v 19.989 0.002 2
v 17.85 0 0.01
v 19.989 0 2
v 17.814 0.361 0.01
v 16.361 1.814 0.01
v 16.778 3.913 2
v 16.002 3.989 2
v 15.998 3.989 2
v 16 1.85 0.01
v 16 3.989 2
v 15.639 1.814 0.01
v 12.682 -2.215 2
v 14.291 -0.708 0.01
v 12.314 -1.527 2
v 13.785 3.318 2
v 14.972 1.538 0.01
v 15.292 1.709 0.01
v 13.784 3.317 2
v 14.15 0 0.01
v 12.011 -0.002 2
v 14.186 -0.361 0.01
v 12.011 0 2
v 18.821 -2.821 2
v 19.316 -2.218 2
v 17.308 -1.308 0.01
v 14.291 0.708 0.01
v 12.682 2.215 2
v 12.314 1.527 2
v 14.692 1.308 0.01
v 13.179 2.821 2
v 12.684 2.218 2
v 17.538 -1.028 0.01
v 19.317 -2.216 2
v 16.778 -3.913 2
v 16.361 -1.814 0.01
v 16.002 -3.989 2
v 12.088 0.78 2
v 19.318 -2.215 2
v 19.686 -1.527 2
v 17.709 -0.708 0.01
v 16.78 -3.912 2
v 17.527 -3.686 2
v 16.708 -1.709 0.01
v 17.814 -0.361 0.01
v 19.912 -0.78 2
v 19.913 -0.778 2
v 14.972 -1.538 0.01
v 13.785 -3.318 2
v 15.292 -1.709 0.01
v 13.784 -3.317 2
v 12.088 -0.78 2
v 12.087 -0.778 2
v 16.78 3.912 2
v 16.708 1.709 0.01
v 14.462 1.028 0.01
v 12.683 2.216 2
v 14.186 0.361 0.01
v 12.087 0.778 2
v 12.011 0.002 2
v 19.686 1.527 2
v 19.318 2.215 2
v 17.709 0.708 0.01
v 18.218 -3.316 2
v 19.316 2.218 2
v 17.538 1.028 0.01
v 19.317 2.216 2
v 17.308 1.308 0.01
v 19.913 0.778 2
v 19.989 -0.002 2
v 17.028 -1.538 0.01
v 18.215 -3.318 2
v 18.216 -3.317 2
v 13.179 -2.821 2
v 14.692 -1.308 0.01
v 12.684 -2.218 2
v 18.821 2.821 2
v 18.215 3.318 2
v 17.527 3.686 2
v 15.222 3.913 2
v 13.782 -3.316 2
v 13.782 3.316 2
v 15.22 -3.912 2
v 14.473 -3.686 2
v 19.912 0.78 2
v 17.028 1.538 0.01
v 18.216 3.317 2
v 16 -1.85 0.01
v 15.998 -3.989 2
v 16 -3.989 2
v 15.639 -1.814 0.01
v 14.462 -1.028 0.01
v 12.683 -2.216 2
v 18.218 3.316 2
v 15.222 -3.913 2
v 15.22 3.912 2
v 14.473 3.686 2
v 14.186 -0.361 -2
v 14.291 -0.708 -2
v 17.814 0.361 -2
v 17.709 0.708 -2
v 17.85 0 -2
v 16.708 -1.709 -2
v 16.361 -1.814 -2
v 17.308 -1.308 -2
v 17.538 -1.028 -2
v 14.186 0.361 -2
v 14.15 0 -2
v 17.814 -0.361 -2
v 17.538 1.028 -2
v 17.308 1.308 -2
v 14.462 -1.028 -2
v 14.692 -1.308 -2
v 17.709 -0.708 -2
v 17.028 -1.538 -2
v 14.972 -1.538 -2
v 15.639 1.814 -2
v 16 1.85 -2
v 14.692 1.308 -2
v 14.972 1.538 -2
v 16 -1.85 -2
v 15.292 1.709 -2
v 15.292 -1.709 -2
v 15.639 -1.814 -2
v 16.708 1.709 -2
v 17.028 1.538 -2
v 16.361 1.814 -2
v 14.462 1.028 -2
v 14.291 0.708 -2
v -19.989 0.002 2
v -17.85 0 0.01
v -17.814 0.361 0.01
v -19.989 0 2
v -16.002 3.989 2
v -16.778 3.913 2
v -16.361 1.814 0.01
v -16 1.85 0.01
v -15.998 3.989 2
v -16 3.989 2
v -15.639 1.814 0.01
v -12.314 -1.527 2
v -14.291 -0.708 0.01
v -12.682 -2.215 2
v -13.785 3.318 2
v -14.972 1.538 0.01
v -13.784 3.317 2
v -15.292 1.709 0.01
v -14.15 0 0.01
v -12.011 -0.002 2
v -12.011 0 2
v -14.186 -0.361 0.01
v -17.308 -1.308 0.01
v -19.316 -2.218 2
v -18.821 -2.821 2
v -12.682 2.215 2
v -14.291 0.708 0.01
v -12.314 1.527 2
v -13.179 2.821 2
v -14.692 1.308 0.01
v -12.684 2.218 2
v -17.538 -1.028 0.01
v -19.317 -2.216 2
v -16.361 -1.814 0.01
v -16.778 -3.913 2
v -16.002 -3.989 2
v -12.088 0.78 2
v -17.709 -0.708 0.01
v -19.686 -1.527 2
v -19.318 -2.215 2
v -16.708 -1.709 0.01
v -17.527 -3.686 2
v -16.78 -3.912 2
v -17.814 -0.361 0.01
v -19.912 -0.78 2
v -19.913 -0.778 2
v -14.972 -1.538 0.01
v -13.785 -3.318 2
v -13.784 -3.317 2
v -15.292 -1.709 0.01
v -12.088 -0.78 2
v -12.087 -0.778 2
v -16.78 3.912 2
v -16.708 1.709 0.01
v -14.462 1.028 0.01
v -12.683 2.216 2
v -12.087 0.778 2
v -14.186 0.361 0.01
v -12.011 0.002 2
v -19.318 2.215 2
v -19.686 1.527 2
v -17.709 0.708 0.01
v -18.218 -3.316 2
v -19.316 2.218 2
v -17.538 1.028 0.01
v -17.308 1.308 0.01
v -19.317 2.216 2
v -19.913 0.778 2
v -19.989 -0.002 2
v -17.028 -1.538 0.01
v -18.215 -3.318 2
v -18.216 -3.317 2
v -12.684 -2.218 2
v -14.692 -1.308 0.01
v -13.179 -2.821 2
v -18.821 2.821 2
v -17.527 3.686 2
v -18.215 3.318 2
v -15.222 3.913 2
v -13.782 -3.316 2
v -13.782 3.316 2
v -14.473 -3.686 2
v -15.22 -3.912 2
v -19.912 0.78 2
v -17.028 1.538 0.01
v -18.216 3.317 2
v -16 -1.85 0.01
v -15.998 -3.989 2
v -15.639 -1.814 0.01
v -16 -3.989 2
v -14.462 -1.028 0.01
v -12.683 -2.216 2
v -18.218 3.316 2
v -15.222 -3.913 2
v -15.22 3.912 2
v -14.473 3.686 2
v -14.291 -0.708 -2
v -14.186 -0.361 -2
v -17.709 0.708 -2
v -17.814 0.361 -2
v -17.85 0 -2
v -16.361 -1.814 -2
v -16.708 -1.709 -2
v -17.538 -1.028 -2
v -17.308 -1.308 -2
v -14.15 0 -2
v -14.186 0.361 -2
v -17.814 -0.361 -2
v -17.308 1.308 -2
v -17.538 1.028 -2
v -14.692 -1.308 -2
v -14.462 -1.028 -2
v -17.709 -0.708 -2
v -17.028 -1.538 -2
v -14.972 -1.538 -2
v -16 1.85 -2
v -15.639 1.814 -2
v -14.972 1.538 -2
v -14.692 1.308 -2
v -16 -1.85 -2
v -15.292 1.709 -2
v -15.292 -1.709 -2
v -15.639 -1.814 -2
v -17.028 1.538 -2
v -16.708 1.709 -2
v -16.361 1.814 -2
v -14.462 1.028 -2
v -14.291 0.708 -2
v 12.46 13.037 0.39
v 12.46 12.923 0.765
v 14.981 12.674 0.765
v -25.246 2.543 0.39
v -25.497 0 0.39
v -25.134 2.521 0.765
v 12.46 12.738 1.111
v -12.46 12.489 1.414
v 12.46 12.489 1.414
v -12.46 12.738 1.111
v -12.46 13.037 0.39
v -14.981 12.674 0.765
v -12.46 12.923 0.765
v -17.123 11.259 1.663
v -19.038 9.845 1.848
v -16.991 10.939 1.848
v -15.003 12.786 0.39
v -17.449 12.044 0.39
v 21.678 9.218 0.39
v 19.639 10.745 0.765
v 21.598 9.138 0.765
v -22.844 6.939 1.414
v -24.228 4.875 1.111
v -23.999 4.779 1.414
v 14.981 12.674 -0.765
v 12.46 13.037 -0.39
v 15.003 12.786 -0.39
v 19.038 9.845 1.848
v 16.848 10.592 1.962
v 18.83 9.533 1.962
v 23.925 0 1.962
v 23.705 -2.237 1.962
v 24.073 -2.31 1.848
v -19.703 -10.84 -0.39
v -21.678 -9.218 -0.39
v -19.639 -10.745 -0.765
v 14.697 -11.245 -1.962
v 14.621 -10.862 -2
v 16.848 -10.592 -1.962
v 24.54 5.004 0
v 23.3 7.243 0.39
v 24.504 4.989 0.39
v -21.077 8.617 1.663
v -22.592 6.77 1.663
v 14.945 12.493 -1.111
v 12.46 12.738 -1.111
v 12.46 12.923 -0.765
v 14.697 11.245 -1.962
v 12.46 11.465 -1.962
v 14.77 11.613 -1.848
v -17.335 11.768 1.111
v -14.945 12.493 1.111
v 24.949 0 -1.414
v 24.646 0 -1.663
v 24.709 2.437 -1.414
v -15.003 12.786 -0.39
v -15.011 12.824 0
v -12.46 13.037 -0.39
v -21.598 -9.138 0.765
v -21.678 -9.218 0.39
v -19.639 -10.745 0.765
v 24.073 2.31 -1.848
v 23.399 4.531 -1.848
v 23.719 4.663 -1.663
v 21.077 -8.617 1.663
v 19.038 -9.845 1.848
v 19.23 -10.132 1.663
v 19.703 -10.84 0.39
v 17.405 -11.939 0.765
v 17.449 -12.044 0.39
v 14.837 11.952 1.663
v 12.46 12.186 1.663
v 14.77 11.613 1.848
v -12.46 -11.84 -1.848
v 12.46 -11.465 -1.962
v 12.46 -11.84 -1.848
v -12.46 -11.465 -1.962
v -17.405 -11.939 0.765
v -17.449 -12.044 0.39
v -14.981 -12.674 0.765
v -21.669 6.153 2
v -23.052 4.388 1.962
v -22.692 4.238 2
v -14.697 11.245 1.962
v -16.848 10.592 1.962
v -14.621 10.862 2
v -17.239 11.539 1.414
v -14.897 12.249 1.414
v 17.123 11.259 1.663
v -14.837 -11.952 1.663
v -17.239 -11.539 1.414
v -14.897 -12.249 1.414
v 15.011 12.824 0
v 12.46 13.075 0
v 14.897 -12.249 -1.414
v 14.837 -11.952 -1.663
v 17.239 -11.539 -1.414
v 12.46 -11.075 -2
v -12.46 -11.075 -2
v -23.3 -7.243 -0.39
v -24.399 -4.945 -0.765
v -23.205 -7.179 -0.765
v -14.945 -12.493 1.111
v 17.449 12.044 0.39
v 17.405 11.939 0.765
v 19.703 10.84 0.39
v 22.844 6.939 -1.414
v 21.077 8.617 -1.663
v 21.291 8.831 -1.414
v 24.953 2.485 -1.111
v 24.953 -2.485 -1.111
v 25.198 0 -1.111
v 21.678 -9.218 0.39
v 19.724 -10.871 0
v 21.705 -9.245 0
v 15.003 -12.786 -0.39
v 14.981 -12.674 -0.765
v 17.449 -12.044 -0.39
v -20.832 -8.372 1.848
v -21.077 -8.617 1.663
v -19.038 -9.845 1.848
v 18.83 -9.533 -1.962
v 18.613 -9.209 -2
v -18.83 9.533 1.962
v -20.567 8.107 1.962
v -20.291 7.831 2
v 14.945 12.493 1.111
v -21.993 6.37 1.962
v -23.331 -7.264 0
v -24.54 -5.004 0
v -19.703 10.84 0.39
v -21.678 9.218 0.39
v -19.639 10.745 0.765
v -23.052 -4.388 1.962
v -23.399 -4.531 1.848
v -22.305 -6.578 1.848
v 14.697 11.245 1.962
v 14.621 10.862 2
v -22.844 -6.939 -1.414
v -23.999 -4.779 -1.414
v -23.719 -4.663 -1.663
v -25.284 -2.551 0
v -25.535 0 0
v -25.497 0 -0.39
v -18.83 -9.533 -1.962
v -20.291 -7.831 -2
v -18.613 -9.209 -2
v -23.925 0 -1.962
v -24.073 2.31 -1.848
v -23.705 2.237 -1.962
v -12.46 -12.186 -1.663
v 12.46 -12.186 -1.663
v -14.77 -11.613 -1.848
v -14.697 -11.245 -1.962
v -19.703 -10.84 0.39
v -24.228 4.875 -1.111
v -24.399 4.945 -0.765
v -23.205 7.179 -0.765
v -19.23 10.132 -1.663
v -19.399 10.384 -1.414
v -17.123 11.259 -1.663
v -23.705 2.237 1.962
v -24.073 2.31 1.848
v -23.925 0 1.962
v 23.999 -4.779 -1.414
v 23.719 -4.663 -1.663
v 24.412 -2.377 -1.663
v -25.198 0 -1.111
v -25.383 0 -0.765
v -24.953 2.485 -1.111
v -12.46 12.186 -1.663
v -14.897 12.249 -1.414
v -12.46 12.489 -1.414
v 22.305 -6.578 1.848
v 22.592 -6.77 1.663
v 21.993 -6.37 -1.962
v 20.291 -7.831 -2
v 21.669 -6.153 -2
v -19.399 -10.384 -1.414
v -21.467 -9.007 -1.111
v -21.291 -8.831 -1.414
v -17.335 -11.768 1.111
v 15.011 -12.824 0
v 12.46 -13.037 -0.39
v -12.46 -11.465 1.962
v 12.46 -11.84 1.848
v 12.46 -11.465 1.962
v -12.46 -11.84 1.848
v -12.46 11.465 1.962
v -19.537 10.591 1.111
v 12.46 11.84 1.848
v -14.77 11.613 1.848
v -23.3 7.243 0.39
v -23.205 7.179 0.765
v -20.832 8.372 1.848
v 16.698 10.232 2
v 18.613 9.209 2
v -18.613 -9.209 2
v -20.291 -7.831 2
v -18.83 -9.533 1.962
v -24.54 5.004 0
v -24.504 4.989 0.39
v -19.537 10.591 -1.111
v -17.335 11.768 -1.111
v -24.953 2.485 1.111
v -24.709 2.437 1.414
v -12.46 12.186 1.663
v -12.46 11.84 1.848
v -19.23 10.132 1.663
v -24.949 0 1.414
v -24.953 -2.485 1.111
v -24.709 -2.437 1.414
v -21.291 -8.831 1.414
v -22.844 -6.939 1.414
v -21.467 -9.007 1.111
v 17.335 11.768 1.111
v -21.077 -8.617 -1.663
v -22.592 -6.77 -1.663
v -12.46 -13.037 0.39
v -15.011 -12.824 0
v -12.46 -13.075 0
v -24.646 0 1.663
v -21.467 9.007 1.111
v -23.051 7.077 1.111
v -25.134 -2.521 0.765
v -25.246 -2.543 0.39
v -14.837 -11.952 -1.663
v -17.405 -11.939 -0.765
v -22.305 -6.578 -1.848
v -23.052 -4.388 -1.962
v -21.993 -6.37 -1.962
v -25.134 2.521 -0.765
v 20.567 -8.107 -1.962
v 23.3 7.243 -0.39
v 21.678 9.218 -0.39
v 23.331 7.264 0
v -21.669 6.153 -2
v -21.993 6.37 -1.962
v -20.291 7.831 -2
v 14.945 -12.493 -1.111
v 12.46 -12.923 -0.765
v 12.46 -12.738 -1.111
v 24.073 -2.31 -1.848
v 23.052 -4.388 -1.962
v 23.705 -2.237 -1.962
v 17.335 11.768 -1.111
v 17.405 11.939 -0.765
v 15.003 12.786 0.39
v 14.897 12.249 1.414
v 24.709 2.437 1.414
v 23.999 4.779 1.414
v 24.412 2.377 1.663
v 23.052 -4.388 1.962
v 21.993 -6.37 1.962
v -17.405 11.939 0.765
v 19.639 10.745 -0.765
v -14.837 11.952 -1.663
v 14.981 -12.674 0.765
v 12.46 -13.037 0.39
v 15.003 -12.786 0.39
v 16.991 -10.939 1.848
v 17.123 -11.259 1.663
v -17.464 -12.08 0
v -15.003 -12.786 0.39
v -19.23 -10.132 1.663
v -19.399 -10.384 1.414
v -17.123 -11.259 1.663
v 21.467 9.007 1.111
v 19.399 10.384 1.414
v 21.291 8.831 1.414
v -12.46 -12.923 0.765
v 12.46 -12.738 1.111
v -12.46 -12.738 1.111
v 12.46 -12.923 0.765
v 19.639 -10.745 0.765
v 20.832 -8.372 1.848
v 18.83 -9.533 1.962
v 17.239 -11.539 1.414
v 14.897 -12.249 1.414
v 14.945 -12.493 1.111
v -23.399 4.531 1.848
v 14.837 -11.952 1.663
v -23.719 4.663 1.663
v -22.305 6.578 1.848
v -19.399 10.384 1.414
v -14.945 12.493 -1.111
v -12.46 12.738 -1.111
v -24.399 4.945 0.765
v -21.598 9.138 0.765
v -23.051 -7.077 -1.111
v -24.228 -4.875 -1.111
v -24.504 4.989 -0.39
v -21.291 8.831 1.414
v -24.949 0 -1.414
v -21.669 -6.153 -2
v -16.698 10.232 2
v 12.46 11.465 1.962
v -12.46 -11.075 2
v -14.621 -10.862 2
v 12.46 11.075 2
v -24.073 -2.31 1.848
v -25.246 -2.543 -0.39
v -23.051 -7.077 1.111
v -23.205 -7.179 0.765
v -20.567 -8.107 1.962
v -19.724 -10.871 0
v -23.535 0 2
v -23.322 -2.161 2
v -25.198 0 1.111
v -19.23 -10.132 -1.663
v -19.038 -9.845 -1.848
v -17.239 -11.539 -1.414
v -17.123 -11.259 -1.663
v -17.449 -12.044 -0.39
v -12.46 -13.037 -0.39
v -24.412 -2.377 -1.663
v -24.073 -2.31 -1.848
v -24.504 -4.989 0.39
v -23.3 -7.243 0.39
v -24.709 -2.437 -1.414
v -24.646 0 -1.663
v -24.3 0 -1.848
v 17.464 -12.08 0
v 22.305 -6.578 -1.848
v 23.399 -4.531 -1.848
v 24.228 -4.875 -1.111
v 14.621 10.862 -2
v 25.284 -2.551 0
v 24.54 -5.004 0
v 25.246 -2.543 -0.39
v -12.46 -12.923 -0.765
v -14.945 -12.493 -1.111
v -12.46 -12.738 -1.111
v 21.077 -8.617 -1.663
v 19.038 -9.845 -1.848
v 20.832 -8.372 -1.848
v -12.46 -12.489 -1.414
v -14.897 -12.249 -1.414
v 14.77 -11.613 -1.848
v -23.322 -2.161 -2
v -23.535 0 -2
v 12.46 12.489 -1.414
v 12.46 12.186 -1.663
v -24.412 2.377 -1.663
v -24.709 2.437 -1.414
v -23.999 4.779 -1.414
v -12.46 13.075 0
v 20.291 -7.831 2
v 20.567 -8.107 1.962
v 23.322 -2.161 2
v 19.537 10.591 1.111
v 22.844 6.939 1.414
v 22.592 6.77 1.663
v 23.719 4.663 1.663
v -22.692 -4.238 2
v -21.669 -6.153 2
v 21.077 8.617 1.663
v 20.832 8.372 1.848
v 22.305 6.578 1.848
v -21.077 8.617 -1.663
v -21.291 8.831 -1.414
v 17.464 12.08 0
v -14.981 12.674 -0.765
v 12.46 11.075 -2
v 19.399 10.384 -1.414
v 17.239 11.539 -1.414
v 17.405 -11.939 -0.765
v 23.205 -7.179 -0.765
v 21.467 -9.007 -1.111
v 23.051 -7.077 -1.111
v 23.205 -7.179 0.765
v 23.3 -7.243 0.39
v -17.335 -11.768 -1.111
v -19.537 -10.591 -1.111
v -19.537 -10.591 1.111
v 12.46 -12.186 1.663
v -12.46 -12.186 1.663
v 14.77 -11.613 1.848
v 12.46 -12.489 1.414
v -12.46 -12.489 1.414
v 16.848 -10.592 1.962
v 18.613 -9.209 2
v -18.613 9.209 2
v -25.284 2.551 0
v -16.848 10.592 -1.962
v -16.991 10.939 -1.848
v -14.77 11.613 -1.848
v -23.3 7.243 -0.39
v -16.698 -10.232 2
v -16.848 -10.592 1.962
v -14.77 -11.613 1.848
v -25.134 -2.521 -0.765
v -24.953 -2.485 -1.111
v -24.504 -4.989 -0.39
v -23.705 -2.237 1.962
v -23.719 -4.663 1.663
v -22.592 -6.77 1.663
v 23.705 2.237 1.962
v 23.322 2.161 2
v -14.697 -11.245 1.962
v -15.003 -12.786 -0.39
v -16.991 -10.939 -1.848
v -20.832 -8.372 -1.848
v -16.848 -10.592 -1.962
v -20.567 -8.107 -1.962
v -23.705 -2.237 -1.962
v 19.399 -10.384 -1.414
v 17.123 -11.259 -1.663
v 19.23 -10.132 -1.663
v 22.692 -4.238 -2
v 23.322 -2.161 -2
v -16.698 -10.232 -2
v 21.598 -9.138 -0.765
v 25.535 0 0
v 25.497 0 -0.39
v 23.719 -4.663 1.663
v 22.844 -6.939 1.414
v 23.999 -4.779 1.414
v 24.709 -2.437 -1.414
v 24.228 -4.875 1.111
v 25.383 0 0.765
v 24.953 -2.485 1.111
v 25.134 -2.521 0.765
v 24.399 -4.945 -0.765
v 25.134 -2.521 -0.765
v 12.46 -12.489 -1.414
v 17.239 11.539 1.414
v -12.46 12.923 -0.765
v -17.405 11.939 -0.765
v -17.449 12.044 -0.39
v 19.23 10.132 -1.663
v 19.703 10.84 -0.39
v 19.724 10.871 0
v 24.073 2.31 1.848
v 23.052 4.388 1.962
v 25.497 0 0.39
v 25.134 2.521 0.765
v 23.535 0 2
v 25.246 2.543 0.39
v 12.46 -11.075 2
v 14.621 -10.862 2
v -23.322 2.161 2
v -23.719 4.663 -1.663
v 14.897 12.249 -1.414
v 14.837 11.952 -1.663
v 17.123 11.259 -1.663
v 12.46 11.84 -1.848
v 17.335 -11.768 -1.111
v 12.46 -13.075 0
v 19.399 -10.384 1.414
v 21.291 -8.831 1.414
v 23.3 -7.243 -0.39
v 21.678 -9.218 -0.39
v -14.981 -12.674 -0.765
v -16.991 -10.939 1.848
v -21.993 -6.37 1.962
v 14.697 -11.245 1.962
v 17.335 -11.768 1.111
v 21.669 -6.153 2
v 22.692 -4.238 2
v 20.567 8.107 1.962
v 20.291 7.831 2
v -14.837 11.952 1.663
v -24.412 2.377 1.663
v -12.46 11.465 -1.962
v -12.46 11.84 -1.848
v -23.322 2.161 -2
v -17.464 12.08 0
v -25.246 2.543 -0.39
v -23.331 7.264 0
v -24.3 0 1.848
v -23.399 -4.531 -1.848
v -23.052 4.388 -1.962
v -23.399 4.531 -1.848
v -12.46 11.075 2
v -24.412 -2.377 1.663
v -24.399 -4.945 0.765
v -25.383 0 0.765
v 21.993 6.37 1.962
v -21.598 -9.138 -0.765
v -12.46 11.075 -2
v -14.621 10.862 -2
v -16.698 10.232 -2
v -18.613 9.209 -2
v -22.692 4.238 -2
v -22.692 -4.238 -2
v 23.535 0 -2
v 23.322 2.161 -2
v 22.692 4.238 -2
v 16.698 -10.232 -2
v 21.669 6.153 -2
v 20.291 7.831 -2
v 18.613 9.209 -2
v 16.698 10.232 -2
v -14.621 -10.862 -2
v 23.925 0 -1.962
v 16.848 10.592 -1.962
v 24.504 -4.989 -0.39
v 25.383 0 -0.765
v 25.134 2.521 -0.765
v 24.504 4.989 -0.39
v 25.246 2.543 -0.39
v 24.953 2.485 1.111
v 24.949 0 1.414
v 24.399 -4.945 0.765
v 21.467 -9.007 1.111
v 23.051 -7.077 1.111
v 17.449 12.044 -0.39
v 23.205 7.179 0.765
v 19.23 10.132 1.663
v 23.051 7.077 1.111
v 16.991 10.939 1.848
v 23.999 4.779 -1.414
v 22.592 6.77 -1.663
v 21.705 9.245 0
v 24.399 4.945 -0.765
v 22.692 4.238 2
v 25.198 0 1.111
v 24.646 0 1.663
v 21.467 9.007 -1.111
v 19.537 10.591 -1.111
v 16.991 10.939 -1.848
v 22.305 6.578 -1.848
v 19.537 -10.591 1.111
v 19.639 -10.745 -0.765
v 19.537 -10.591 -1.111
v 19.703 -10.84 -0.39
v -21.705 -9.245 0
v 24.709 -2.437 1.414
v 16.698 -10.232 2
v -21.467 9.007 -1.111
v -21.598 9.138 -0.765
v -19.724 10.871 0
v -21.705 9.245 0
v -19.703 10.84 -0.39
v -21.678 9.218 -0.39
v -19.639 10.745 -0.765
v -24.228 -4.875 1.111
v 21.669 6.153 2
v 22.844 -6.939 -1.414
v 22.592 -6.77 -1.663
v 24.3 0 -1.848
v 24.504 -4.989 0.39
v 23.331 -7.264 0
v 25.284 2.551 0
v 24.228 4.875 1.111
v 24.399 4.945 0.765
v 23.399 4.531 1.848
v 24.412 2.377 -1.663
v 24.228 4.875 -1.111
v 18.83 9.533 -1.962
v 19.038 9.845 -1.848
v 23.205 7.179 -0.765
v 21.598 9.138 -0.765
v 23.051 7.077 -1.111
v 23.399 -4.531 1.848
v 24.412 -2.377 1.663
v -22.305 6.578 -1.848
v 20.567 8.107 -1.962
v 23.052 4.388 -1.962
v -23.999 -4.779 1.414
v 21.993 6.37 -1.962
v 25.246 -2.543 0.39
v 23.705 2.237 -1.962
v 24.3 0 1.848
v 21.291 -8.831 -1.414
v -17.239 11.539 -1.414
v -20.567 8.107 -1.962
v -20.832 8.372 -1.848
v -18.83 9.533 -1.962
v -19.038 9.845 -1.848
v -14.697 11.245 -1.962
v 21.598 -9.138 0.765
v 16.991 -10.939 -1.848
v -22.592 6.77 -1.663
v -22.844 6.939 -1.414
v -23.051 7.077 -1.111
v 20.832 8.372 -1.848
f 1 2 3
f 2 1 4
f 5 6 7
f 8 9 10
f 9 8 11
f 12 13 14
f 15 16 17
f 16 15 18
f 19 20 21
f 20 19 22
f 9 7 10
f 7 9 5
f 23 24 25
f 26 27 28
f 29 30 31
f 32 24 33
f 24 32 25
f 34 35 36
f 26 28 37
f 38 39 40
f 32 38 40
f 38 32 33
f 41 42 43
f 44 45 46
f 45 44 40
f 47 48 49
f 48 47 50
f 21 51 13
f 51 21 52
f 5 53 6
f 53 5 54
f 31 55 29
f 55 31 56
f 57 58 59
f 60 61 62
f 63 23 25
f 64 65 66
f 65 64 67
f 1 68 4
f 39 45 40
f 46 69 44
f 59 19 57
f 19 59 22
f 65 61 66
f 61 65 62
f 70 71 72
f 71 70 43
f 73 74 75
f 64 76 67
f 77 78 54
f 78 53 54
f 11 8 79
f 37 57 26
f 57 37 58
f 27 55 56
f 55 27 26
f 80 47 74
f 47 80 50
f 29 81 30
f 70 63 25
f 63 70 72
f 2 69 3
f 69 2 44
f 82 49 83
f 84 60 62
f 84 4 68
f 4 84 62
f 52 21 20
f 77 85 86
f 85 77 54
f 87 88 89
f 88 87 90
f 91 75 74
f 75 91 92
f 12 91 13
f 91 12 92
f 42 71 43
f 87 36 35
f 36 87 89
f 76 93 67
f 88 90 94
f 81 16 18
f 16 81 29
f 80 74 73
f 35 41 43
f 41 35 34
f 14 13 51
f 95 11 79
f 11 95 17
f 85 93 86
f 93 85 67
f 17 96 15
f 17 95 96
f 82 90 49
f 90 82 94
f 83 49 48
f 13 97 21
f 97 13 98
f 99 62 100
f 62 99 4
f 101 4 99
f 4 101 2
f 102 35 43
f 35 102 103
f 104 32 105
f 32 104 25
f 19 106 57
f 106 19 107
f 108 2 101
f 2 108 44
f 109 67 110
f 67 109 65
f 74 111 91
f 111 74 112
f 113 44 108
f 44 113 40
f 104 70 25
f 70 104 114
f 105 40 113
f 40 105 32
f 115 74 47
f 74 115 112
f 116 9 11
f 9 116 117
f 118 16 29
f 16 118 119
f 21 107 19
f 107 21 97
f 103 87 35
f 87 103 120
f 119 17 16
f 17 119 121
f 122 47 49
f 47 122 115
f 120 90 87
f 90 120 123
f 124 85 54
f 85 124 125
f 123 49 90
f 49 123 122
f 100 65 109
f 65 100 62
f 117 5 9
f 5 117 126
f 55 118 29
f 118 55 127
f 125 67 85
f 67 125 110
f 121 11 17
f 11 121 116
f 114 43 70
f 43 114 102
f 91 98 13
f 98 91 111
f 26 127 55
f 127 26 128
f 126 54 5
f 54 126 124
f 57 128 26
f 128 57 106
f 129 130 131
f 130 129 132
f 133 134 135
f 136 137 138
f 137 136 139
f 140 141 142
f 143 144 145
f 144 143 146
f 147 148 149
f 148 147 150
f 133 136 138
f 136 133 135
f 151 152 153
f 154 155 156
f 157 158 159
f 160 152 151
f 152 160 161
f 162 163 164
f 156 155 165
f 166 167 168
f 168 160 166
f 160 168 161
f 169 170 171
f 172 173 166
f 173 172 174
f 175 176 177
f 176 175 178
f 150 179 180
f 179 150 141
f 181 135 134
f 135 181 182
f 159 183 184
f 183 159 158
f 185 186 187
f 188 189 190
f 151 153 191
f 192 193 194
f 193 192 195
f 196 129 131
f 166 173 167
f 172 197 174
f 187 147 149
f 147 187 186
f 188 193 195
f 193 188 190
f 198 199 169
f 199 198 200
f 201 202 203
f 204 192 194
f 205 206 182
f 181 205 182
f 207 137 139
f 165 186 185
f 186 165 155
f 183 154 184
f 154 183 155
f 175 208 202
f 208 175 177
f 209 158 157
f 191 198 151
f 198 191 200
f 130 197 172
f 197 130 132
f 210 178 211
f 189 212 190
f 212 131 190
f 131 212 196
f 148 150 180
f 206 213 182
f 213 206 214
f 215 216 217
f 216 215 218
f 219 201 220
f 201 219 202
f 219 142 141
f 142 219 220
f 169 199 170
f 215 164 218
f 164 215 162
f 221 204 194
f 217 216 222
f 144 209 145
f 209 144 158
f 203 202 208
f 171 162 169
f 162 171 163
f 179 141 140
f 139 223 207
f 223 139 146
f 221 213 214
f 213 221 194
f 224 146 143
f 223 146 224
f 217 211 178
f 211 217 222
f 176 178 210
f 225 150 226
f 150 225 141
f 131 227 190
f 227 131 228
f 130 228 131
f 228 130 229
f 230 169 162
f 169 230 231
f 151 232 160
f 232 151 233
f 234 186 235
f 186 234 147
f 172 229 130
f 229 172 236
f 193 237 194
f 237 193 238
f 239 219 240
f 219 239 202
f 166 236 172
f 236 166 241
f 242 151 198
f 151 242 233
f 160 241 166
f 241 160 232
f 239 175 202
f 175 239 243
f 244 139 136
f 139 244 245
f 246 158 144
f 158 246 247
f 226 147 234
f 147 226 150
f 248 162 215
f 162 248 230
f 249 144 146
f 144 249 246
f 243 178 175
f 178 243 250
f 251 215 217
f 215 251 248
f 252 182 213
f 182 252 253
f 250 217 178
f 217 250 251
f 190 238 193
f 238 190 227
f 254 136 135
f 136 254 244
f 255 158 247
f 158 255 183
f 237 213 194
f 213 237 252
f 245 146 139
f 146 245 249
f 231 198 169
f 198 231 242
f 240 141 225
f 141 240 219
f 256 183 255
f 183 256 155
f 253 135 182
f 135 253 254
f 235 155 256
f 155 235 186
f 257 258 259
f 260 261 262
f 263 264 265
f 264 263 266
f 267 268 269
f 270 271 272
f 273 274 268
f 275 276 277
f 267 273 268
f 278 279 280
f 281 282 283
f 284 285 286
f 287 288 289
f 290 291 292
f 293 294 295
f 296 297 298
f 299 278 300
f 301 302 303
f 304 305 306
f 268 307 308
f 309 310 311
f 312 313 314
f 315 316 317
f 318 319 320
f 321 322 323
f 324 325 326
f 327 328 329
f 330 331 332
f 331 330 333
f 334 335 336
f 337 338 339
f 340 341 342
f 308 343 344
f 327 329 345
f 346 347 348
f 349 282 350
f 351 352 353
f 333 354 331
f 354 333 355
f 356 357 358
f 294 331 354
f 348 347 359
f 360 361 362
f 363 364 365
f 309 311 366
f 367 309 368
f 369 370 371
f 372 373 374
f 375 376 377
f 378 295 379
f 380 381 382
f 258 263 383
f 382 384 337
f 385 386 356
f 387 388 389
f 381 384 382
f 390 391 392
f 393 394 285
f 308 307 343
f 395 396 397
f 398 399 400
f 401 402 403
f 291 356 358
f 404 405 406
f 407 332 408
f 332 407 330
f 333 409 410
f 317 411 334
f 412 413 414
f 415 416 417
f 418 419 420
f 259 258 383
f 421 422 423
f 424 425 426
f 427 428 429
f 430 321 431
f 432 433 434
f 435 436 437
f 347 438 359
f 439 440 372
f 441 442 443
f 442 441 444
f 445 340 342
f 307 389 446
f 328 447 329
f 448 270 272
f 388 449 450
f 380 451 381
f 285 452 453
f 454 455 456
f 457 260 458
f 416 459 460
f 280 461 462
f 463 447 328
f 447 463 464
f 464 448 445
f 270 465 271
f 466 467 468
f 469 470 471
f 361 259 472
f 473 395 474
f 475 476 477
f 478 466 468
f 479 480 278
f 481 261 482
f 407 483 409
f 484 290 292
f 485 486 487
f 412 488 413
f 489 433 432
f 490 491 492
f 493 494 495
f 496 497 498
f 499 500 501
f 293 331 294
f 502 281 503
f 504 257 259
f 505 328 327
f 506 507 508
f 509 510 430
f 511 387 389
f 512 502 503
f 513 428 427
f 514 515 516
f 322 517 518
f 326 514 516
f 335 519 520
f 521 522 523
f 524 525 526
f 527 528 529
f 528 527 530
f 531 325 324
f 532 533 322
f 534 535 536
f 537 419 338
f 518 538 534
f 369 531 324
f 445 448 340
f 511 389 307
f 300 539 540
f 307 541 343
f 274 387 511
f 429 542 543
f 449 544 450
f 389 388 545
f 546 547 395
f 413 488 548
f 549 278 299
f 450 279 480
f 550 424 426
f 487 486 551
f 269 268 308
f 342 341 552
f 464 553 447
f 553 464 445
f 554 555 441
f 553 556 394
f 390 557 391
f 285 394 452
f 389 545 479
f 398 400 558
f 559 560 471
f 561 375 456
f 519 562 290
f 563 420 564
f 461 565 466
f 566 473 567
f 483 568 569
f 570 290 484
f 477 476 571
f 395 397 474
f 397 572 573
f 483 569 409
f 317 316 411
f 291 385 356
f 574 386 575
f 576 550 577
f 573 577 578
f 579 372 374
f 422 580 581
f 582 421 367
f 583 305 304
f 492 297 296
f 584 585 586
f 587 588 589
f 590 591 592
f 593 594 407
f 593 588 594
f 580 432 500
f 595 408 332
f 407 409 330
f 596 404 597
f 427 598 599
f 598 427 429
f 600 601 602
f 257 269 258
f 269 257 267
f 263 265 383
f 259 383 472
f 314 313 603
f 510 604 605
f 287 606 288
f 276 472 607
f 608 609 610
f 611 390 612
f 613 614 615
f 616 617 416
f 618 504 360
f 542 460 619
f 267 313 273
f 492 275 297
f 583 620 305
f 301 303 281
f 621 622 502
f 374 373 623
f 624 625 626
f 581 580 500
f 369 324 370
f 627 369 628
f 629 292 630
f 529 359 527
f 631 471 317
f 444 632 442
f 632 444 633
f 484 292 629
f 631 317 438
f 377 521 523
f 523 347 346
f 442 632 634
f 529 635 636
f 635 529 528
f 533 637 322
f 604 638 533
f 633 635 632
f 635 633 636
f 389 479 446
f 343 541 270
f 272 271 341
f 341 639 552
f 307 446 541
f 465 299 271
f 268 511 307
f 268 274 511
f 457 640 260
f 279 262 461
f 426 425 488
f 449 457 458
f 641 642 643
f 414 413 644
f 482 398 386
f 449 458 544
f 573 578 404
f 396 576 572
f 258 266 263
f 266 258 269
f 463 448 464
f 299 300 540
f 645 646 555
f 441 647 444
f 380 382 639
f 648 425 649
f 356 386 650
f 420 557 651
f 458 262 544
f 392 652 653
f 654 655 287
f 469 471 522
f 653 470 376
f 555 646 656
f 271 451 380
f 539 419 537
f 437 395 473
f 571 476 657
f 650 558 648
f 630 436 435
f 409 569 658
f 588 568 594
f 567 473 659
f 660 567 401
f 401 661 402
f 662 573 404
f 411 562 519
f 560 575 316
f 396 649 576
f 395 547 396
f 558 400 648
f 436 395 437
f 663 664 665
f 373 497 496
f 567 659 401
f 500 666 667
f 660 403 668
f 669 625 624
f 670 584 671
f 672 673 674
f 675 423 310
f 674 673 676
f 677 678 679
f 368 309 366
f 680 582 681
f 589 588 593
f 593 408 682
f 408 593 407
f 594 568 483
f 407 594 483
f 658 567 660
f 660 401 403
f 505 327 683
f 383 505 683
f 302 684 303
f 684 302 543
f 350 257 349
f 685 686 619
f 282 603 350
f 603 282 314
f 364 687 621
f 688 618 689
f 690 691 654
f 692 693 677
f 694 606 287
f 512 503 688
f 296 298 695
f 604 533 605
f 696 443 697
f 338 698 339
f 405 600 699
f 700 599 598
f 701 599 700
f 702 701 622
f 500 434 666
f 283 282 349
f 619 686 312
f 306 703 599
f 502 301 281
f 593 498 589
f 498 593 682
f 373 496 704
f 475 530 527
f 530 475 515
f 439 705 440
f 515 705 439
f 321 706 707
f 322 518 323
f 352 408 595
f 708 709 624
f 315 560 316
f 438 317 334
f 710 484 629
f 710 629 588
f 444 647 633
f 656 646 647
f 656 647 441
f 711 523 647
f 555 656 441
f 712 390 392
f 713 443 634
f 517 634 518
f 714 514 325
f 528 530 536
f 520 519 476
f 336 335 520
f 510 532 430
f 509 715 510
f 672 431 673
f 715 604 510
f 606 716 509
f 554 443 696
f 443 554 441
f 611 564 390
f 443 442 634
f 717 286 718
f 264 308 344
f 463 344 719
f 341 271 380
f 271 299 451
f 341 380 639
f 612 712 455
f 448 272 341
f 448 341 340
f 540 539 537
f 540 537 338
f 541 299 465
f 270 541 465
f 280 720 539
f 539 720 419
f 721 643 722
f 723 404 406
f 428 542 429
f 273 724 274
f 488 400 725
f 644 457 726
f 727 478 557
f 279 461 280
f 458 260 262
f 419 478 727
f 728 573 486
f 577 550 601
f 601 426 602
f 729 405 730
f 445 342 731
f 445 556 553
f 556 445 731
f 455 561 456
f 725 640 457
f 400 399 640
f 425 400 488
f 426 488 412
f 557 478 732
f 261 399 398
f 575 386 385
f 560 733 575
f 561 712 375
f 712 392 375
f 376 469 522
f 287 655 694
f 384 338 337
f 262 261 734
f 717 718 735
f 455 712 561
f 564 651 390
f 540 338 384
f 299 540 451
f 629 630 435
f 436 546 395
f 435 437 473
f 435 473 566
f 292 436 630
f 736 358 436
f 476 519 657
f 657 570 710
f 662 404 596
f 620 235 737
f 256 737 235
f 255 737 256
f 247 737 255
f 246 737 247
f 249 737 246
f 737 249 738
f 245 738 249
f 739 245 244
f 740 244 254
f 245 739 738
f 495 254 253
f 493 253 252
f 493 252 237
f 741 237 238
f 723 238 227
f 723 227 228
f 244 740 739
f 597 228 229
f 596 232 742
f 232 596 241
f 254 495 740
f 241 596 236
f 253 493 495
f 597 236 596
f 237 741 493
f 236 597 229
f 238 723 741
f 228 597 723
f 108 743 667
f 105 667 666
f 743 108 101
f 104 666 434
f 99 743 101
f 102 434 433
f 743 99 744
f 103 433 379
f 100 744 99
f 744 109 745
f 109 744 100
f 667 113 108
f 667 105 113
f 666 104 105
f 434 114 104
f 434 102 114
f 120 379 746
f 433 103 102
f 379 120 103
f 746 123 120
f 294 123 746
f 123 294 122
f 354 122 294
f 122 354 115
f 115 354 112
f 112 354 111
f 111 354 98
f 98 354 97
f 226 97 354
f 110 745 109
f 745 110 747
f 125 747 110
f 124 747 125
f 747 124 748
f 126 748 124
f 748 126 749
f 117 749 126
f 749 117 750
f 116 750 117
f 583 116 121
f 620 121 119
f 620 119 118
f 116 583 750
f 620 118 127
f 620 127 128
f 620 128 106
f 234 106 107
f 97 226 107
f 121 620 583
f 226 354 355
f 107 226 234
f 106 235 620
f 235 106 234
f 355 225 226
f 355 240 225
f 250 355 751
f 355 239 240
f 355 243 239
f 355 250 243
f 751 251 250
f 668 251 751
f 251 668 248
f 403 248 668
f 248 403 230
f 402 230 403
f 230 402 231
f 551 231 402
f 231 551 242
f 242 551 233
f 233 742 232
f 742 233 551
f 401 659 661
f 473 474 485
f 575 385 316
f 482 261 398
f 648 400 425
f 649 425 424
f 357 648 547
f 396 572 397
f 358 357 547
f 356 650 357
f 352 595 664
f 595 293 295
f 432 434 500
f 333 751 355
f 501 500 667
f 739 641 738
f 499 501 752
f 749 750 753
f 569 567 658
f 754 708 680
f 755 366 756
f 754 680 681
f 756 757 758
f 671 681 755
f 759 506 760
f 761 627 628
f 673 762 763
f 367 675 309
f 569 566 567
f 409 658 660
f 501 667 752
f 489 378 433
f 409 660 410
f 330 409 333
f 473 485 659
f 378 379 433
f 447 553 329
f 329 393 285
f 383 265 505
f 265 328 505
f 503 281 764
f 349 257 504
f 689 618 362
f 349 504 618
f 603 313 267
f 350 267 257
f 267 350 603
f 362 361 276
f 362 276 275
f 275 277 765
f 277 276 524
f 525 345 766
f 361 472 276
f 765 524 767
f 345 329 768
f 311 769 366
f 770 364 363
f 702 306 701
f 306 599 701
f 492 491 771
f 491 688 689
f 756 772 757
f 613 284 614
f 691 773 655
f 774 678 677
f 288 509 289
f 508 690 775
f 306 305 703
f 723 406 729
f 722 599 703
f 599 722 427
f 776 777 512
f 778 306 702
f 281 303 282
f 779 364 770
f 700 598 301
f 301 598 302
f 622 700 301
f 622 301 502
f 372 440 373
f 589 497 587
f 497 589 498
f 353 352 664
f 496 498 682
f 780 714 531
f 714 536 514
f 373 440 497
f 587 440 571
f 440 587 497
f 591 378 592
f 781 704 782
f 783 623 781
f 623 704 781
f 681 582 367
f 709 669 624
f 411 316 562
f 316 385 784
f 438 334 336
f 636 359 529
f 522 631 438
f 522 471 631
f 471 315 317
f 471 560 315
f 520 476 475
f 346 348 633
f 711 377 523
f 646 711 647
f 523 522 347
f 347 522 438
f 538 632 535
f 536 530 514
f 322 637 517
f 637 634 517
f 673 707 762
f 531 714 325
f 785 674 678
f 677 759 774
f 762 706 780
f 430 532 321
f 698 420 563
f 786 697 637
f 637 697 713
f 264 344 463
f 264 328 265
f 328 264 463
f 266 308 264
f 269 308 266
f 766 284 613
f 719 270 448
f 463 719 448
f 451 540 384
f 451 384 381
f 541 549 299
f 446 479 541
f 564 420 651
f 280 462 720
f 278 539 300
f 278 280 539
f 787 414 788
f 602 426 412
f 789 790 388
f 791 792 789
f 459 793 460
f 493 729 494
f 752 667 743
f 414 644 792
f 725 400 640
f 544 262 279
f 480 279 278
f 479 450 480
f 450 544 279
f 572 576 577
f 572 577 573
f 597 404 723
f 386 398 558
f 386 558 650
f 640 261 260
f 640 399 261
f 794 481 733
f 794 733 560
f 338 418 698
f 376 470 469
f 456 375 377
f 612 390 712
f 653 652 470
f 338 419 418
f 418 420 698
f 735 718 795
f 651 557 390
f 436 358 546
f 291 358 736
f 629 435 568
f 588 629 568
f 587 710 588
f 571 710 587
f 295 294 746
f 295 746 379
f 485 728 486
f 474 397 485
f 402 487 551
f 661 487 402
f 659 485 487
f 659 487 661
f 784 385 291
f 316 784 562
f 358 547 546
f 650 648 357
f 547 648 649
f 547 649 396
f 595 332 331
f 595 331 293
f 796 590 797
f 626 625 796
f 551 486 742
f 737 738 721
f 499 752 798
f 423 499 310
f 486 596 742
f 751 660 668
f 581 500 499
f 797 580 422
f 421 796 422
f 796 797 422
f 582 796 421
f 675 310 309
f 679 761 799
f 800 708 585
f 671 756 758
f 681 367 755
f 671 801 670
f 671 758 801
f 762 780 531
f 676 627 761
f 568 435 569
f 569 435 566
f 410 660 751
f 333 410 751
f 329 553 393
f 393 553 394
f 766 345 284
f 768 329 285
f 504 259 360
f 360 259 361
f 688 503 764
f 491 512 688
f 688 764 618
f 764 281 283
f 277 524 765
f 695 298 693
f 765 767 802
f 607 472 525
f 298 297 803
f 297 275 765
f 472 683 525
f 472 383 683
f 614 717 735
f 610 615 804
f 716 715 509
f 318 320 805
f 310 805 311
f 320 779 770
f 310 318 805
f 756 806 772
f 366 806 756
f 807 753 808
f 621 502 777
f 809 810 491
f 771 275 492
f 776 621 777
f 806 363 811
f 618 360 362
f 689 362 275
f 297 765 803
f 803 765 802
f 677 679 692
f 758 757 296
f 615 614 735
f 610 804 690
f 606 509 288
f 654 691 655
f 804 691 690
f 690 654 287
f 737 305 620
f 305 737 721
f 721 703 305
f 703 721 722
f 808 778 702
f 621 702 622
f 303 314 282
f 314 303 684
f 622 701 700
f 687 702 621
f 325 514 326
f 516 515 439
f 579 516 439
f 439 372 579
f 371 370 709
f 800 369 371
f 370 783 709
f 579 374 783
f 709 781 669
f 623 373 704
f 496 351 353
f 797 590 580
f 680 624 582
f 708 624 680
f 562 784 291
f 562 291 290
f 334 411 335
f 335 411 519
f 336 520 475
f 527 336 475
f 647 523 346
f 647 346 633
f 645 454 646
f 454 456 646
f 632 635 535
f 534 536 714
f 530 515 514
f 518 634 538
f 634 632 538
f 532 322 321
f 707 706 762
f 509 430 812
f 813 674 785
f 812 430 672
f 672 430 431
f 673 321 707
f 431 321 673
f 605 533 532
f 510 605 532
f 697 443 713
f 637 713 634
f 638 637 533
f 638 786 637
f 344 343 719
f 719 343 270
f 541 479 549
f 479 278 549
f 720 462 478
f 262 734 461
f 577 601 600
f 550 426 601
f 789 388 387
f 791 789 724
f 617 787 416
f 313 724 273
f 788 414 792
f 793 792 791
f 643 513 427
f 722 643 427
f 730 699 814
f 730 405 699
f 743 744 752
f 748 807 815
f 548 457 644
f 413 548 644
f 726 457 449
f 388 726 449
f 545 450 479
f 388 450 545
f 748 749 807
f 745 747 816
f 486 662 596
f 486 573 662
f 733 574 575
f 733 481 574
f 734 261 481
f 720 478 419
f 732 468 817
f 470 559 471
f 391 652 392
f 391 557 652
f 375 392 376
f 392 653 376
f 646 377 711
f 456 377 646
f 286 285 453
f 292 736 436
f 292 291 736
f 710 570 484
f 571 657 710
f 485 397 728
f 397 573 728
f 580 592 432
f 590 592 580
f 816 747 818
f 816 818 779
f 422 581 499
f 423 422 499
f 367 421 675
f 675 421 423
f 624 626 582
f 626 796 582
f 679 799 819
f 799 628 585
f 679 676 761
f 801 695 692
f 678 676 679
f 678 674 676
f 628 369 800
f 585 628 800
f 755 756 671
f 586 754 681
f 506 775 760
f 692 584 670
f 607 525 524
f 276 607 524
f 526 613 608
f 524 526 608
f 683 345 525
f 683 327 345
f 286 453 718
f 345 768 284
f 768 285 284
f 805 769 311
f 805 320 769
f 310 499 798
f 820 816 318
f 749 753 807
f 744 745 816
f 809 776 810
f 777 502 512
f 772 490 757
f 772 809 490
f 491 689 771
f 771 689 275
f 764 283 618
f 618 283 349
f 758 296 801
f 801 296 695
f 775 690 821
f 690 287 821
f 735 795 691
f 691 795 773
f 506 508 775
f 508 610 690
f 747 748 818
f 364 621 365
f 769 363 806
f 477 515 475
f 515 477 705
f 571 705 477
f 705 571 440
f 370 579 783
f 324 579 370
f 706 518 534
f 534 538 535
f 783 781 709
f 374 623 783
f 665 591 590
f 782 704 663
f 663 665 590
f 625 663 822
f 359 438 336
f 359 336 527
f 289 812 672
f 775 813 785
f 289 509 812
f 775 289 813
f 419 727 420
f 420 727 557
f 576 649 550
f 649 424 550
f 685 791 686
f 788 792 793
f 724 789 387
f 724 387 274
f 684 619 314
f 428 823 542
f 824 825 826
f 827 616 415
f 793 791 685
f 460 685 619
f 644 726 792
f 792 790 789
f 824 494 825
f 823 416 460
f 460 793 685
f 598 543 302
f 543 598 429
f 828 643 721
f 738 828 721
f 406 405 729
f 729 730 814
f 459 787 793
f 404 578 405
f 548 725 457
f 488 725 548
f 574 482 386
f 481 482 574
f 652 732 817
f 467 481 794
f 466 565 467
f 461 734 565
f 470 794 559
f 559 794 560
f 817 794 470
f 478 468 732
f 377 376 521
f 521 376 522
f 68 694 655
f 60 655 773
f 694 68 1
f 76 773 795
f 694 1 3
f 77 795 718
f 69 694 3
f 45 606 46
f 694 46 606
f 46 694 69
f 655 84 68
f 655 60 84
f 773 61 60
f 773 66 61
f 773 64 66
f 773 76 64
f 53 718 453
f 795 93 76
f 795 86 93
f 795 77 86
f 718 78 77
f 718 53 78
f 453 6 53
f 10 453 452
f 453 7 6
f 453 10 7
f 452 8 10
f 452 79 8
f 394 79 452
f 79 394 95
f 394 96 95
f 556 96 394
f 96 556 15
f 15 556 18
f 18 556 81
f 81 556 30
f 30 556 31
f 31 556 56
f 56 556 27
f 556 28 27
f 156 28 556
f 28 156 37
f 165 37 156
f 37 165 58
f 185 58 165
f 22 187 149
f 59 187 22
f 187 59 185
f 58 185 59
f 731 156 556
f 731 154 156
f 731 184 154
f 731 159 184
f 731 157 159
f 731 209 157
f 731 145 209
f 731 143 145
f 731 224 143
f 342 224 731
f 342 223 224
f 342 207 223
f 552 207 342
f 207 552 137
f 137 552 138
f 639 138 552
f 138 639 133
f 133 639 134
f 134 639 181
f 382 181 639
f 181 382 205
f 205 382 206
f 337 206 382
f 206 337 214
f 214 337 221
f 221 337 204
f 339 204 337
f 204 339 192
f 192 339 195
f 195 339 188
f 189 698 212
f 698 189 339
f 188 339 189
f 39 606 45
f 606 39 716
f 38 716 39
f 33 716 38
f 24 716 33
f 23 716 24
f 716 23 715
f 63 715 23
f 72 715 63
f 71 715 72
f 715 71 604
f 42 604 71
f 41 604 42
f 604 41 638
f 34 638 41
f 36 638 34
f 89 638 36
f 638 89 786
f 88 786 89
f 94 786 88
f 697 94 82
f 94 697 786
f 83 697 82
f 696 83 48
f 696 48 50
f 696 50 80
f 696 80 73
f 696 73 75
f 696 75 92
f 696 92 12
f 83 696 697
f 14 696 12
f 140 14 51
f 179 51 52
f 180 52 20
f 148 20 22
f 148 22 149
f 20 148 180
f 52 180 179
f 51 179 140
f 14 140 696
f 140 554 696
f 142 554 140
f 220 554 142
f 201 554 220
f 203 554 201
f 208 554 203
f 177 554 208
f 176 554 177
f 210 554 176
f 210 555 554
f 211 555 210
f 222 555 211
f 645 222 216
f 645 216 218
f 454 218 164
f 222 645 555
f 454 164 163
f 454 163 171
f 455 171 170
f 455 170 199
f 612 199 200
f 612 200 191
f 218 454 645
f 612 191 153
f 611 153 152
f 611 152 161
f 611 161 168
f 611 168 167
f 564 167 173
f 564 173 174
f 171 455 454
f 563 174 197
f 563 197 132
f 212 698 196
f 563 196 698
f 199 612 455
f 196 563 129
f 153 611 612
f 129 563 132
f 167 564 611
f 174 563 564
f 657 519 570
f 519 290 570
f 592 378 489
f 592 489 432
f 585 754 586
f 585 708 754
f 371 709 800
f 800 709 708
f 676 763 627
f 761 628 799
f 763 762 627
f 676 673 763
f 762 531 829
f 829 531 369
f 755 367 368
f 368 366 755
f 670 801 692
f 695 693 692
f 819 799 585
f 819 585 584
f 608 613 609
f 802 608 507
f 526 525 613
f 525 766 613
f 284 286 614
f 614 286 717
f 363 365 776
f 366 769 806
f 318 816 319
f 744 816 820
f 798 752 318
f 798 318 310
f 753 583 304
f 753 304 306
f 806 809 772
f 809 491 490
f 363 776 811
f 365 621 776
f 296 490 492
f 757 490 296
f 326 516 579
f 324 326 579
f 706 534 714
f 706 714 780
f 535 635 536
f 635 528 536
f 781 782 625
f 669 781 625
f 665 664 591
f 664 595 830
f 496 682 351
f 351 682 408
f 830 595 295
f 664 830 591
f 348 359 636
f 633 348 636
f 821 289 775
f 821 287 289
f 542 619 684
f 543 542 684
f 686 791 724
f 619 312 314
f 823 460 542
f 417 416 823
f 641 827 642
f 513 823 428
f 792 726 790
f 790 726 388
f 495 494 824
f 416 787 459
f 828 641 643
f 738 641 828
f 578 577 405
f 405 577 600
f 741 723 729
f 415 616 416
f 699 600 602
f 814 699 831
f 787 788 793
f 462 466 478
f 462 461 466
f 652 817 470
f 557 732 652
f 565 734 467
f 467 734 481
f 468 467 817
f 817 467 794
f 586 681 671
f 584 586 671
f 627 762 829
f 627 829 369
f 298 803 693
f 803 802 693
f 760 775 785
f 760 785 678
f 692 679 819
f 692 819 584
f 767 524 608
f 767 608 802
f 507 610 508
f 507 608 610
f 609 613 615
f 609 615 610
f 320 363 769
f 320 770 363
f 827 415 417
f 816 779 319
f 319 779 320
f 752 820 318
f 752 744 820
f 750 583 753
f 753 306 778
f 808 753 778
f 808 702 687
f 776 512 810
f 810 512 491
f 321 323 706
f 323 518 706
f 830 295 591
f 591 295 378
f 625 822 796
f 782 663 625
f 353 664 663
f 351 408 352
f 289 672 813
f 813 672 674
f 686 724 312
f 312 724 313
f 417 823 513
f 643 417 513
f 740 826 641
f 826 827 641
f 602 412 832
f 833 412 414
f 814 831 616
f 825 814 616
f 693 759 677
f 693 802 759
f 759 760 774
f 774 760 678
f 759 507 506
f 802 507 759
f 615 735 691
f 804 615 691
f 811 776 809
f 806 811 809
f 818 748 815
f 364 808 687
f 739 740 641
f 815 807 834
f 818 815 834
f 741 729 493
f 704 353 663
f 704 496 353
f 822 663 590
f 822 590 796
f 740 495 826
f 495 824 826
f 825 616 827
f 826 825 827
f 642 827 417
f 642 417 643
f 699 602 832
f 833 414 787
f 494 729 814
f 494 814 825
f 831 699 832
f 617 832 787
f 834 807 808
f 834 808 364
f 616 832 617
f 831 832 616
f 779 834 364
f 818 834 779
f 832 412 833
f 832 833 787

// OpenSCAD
$fn=32;

module faceplate_end(length, big_r, small_r){
    translate([(length/2.0)-big_r, 0,0]){
        intersection(){
            rotate_extrude(){
                translate([big_r-small_r,0,0]){
                    circle(small_r);
                }
            }
            translate([50,0,0]){
                cube([100,100,100], center=true);
            }
        }
    }
}

module faceplate_side(length, big_r, small_r){
    translate([0, big_r-small_r, 0]){
        rotate([0,90,0]){
            cylinder(h=(length-big_r*2), r=small_r, center=true);
        }
    }
}
module screw(head_height, head_top_dia, screw_dia){
    body_height = 10;
    union(){
        // cone head
        translate([0,0,-head_height/2]){
            cylinder(h=head_height, d1=screw_dia, d2=head_top_dia, center=true);
        }
        // screw body
        translate([0,0,-(body_height/2 + head_height)]){
            cylinder(h=body_height+0.01, d=screw_dia, center=true); 
        }
    }
  
}
    

module faceplate(){
    big_r = 26.15/2;
    small_r=2;
    length=51.07;
    hole_spacing = 32;
    
    difference(){
        hull(){
            // rounded ends
            mirror([1,0,0]){
                faceplate_end(length=length, big_r=big_r, small_r=small_r);

               
            }
            faceplate_end(length=length, big_r=big_r, small_r=small_r);
            // sides
            mirror([0,1,0]){
                faceplate_side(length=length, big_r=big_r, small_r=small_r);
            }
            faceplate_side(length=length, big_r=big_r, small_r=small_r);
        }
        // screw holes
        mirror([1,0,0]){
            translate([hole_spacing/2,0,small_r+0.01]){
                screw(head_height=2, head_top_dia=8, screw_dia=3.7);
            }
        }
        translate([hole_spacing/2,0,small_r+0.01]){
            screw(head_height=2, head_top_dia=8, screw_dia=3.7);
        }

    }
}
faceplate();
